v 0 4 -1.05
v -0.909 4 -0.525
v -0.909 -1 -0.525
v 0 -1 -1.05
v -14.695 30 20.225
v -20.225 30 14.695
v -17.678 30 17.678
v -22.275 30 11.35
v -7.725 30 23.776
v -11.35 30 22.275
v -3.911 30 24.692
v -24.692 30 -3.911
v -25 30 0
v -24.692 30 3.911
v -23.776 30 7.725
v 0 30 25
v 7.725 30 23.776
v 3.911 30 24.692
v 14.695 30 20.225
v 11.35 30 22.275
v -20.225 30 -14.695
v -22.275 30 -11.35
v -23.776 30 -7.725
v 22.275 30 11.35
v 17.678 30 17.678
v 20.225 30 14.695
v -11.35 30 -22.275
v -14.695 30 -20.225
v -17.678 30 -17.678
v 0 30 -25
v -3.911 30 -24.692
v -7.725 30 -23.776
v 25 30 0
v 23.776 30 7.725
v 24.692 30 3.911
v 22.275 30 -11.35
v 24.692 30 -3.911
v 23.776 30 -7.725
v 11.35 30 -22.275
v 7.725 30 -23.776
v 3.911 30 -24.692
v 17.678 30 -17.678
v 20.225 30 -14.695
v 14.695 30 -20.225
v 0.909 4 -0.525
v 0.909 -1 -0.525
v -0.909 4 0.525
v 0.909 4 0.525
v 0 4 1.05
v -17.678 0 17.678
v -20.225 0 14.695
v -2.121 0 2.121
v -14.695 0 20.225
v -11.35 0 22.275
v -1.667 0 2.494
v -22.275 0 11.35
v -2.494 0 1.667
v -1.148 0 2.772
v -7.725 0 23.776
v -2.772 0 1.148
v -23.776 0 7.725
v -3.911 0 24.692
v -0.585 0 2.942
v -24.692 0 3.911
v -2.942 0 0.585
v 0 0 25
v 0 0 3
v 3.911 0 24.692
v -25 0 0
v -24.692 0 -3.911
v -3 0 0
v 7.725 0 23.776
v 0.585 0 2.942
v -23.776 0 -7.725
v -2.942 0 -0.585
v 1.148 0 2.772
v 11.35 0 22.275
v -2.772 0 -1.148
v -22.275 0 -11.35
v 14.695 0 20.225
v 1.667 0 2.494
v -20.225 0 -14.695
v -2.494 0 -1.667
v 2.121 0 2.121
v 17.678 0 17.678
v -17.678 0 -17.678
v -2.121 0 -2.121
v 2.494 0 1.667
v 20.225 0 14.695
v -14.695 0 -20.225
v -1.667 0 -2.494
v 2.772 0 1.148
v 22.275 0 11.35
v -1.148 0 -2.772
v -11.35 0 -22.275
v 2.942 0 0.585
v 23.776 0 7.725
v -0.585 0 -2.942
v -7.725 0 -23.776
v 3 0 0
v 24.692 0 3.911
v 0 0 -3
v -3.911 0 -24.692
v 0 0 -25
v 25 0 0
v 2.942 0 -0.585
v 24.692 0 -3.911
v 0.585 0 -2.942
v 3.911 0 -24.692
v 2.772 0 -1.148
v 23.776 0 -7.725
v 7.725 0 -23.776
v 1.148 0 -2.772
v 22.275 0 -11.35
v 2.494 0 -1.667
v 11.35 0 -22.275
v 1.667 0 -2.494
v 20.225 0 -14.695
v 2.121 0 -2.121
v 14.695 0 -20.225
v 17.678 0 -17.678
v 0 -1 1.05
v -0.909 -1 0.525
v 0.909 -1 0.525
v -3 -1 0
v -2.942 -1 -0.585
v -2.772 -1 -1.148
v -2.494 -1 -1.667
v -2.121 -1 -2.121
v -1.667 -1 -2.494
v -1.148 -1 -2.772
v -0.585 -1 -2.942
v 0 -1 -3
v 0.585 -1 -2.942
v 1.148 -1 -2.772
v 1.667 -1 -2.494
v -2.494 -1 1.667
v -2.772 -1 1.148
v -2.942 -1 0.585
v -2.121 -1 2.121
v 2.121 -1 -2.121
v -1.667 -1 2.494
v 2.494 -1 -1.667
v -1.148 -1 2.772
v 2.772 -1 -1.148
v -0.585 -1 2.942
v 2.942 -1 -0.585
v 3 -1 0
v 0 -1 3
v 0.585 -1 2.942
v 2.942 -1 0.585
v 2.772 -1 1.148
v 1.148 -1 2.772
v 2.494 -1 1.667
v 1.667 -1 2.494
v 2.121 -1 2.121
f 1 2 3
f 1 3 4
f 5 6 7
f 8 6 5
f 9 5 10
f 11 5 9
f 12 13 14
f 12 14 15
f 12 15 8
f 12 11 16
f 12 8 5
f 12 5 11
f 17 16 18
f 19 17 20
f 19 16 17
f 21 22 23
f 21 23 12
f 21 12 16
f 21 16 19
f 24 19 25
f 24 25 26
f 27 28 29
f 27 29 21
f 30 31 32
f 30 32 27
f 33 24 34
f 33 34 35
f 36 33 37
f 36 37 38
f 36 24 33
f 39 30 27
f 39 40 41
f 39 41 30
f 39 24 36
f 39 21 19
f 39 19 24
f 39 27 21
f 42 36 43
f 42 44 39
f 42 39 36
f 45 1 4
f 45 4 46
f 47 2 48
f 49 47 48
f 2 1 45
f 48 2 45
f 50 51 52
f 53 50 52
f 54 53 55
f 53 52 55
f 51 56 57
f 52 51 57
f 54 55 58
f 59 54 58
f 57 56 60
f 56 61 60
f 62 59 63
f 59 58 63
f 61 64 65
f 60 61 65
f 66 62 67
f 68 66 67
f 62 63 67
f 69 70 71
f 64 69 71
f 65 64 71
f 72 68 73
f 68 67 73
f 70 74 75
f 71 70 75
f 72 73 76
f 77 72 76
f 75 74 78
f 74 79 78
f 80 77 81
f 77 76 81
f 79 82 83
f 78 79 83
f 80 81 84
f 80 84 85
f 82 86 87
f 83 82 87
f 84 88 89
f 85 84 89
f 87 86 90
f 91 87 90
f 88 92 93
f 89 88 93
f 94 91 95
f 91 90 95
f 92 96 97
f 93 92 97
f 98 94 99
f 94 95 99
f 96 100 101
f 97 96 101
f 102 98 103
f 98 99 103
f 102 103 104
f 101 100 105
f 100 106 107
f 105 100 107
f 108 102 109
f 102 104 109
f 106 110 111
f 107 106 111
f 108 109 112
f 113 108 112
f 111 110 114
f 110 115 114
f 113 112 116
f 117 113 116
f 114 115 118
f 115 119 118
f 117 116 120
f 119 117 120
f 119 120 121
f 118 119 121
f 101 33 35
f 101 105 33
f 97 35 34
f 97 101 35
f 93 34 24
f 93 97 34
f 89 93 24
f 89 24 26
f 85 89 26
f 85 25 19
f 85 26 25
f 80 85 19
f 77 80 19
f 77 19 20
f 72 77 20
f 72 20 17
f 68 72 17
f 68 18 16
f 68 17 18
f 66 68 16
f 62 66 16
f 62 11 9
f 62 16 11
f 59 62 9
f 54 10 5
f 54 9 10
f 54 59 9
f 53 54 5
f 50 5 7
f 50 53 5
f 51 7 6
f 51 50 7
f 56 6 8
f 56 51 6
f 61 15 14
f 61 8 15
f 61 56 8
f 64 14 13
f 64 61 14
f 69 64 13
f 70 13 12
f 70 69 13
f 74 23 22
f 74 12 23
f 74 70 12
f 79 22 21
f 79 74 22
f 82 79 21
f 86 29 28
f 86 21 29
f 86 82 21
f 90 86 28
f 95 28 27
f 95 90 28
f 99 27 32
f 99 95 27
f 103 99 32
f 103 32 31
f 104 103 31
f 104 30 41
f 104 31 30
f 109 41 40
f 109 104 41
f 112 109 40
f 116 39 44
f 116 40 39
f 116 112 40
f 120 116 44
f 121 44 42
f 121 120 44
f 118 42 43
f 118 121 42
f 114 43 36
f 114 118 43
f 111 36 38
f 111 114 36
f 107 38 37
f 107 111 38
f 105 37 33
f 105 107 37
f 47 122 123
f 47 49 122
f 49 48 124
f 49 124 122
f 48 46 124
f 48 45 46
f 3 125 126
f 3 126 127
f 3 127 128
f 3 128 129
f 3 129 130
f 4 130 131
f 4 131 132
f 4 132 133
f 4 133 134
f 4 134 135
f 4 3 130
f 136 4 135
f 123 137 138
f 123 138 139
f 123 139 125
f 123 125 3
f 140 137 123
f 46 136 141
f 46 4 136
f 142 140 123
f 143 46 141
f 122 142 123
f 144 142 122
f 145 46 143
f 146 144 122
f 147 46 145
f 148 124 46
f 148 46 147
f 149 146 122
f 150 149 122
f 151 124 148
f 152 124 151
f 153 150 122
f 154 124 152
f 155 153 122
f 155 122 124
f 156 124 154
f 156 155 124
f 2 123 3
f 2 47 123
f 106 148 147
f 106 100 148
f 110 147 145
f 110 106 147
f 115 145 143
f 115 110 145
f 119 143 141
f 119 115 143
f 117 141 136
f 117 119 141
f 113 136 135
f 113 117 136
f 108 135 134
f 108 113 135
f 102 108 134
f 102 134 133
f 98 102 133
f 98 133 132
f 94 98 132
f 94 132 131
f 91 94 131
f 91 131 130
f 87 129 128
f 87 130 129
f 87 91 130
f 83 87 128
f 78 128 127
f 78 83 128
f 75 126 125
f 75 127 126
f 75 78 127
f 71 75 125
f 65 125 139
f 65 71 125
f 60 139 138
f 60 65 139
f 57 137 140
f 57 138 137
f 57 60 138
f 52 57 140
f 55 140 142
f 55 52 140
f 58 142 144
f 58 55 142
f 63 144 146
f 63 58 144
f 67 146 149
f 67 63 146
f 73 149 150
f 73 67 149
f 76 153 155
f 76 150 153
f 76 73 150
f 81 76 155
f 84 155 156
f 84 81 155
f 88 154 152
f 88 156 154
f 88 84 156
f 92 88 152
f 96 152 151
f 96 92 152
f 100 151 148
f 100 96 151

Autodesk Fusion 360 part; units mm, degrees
sketch "スケッチ1" plane through (0, 0, 0) normal (0, 1, 0) x (1, 0, 0)
  circle A0 centre (0, 0) radius 25
  dimension "d1" = 50
extrude "押し出し1" add sketch "スケッチ1" along normal blind 30
sketch "スケッチ2" plane through (0, 0, 0) normal (0, -1, 0) x (1, 0, 0)
  circle A0 centre (0, 0) radius 25
  circle A1 centre (0, 0) radius 3
  line L0 (0, 1.05) -> (-0.9093, 0.525)
  line L1 (-0.9093, 0.525) -> (-0.9093, -0.525)
  line L2 (-0.9093, -0.525) -> (0, -1.05)
  line L3 (0, -1.05) -> (0.9093, -0.525)
  line L4 (0.9093, -0.525) -> (0.9093, 0.525)
  line L5 (0.9093, 0.525) -> (0, 1.05)
  dimension "d4" = 6
  dimension "d5" = 2.1
extrude "押し出し2" add sketch "スケッチ2" along normal blind 1 contours A1
extrude "押し出し3" cut 1 faces at (0, 0, 0.35) along direction (0, 1, 0) blind 4
